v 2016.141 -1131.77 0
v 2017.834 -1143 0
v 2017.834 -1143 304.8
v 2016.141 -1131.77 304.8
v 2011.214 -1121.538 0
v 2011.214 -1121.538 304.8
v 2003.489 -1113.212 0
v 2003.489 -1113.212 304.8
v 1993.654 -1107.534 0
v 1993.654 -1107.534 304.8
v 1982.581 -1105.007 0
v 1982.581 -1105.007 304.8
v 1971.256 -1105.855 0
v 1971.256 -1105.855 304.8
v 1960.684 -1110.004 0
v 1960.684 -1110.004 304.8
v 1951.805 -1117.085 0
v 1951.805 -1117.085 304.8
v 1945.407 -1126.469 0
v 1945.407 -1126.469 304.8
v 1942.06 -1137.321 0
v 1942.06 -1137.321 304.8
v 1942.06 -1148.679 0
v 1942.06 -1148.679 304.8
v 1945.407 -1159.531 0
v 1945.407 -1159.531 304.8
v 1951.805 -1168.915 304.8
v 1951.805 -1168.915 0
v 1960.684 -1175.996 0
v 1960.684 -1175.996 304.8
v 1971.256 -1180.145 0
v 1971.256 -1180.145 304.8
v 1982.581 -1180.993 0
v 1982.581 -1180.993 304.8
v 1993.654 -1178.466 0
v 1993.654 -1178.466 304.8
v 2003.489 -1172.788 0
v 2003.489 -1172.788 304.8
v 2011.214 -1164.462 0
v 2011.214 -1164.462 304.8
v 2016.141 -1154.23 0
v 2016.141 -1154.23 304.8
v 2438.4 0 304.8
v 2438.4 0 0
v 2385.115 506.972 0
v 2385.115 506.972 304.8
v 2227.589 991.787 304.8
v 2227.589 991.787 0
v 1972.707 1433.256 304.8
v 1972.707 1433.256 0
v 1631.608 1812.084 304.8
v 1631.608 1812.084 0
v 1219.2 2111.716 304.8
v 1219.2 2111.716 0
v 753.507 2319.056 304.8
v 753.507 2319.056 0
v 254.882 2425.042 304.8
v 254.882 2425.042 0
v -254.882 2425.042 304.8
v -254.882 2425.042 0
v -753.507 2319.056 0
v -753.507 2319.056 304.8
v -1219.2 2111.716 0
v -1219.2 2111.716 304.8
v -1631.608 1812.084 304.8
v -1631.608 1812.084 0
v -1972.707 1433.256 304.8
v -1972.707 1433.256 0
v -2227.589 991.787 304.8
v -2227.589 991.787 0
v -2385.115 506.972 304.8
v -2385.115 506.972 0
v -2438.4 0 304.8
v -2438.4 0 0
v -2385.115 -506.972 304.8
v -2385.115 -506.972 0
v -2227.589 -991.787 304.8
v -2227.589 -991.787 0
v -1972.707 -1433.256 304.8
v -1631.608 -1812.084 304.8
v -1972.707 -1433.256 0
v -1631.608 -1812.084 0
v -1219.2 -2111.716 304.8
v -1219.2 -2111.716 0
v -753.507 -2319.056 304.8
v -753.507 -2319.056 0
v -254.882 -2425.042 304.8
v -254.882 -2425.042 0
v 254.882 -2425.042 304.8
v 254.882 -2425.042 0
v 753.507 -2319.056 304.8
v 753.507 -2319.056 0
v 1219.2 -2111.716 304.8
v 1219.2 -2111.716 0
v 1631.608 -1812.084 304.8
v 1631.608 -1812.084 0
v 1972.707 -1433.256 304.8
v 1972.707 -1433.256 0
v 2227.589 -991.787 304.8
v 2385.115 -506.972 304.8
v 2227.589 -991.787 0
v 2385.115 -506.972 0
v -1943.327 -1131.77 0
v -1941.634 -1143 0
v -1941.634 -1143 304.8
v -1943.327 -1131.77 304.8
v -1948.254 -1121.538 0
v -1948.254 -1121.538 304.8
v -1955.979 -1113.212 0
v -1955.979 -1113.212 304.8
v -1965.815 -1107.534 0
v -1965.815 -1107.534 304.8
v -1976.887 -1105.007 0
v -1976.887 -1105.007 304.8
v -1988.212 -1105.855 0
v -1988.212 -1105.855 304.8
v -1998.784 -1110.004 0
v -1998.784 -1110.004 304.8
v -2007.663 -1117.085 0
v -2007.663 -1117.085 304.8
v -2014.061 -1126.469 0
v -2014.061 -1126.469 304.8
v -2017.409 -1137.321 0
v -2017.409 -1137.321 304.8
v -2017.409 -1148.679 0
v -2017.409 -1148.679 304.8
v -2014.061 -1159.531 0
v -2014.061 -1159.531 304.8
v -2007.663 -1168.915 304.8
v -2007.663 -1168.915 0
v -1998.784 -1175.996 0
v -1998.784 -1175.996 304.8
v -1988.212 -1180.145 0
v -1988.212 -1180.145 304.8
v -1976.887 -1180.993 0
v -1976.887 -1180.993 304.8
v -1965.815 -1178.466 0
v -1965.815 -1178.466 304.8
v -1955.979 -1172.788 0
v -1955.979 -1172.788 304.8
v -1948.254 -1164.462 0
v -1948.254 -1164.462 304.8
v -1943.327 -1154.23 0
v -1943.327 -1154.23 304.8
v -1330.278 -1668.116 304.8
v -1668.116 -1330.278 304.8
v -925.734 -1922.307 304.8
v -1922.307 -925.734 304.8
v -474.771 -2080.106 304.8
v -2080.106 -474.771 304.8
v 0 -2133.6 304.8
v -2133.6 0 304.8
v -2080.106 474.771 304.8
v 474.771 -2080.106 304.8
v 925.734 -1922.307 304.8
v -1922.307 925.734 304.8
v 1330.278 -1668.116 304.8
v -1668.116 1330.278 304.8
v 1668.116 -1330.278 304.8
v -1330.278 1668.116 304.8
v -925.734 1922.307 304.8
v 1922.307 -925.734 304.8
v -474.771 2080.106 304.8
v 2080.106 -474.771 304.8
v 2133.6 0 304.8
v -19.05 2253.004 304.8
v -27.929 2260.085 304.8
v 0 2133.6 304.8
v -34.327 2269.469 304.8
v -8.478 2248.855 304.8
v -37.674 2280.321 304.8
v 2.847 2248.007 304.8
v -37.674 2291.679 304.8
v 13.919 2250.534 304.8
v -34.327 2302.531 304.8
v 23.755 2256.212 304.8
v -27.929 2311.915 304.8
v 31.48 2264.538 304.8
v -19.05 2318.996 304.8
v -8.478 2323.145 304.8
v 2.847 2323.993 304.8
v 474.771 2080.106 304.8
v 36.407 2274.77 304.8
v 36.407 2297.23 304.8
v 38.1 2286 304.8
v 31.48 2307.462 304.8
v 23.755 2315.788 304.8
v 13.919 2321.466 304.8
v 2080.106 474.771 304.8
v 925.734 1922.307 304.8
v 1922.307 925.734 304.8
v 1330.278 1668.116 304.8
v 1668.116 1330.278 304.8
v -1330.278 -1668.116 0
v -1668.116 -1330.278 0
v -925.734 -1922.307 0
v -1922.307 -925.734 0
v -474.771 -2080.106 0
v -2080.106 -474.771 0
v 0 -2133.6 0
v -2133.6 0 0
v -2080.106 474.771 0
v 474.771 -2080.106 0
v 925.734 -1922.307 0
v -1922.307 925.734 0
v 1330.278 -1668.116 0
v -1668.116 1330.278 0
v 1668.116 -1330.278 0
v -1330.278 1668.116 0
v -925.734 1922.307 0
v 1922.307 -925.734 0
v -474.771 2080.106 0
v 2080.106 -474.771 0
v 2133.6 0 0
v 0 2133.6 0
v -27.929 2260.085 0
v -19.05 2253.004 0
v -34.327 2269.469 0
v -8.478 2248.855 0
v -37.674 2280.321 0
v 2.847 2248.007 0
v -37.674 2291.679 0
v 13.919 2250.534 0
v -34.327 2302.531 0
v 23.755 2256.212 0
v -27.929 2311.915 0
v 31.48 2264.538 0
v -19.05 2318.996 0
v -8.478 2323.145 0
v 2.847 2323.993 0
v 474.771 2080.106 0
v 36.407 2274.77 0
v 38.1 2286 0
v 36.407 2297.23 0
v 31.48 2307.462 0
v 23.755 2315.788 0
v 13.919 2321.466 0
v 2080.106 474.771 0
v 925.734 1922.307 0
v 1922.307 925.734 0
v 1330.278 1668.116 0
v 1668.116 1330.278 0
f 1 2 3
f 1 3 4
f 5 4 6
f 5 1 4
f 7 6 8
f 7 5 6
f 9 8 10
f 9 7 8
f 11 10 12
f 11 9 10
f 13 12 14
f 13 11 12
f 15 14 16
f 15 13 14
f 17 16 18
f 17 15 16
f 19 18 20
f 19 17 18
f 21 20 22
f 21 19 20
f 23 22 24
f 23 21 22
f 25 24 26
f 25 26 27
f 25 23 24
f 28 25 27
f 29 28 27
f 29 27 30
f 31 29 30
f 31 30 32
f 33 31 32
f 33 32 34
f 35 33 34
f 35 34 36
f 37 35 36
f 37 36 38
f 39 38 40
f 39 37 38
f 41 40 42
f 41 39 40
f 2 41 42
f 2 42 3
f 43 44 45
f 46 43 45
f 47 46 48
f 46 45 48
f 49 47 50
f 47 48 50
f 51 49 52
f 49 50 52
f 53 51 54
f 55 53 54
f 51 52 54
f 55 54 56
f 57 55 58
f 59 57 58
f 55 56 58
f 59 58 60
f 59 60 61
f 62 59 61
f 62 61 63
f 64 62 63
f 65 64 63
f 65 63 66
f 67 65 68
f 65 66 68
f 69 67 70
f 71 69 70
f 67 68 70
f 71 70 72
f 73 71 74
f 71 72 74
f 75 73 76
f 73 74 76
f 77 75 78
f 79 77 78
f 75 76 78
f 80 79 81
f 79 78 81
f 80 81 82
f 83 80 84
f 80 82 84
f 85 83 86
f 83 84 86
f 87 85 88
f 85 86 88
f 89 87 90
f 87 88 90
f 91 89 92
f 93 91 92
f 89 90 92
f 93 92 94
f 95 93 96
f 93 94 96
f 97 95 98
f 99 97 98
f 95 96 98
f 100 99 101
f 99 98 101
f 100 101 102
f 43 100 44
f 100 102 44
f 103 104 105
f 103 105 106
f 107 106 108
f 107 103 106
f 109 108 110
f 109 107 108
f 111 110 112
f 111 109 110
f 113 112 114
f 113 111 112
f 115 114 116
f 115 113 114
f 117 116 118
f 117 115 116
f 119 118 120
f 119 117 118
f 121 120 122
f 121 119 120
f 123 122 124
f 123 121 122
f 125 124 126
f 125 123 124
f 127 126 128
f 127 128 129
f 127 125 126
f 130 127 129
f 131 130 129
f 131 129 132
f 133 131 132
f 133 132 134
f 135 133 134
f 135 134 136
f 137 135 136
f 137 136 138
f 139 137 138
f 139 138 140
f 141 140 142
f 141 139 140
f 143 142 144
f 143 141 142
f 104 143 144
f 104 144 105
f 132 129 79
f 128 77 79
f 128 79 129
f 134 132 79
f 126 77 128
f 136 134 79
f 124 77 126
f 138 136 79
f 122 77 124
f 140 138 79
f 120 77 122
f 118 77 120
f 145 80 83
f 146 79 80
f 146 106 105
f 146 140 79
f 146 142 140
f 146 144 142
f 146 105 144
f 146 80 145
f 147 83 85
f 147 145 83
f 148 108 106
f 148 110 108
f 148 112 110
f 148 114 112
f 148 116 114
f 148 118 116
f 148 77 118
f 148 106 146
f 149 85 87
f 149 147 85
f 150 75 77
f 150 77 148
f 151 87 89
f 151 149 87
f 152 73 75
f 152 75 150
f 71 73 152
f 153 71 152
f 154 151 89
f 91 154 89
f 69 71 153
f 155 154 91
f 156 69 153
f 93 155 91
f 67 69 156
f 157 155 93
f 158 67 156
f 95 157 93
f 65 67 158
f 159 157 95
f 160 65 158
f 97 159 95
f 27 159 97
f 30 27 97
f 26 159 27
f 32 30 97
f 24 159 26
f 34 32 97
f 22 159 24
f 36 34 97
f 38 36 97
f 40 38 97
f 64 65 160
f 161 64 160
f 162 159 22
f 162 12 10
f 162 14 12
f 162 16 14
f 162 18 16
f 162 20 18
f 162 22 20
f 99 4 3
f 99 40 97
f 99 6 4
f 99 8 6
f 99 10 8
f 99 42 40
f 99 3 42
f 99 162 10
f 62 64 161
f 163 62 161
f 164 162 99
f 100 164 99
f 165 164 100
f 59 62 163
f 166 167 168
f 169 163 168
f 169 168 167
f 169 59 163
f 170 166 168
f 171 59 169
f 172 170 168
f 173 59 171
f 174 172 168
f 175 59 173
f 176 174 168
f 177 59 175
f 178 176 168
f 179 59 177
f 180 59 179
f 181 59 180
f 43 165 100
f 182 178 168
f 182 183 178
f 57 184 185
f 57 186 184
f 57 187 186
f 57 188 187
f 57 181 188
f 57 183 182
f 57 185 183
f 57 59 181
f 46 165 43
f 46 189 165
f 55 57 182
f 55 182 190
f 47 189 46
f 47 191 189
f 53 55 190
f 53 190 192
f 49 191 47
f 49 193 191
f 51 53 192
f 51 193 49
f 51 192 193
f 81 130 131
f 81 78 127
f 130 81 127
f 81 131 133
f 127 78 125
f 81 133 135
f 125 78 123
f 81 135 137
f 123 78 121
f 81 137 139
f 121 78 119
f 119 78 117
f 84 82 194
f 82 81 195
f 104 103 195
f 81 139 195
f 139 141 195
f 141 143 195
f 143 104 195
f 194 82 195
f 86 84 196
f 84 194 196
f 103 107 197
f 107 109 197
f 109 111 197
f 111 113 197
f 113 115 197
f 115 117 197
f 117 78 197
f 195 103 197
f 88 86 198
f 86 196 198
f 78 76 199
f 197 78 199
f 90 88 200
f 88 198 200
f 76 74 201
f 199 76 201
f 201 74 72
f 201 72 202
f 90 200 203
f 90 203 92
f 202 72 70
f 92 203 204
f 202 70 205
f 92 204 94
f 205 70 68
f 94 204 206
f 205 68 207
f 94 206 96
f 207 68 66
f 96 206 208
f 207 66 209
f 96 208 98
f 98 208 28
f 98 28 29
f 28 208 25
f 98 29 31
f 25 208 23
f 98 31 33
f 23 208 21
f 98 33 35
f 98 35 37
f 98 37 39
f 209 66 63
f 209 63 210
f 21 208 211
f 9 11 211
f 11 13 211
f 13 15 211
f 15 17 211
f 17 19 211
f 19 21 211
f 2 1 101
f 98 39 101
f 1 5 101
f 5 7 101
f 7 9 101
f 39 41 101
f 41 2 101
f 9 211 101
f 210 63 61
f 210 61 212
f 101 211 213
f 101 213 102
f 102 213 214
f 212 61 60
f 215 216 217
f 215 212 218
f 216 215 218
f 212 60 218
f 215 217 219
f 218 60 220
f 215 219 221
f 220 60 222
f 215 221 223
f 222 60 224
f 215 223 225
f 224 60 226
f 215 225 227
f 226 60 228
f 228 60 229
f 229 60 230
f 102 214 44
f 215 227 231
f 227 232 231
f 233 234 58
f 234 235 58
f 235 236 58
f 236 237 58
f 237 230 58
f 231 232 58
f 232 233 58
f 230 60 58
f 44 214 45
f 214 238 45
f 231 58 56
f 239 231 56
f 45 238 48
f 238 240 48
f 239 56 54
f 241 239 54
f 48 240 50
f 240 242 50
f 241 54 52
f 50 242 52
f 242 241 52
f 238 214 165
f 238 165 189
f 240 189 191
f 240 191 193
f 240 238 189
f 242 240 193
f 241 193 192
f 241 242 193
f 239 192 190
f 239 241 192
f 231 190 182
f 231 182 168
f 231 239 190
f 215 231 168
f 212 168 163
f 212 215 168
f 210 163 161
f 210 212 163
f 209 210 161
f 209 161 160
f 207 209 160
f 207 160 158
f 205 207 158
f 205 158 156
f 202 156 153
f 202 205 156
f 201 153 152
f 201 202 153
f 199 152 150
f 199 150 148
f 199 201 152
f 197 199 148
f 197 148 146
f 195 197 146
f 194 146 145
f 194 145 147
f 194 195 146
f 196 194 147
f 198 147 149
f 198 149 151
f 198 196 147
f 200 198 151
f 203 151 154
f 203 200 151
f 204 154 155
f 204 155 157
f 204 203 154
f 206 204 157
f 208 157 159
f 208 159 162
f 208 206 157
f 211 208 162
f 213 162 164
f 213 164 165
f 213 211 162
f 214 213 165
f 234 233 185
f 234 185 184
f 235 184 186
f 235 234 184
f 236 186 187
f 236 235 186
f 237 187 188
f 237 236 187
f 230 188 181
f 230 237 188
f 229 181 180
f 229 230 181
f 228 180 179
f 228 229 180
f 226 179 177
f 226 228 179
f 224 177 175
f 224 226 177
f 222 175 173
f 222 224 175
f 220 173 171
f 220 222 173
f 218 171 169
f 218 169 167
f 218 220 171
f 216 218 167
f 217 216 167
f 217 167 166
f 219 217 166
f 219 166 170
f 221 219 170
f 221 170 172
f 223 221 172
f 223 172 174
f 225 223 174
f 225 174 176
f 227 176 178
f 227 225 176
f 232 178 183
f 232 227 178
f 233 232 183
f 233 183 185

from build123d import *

# Parameters (mm, degrees)
F0_R     = 2438.4
F0_R_2   = 38.1
F0_R_3   = 2133.6
F1_DEPTH = 304.8


# Not quite as in the source:
# - a feature names something its author has since deleted; it is built from what else it names


with BuildPart() as f1:
    # F0 (on Top) → F1 (new body)
    with BuildSketch(Plane.XY):
        Circle(F0_R)
        with Locations((-1979.7340730512, -1143)):
            Circle(F0_R_2, mode=Mode.SUBTRACT)
        with Locations((1979.7340730512, -1143)):
            Circle(F0_R_2, mode=Mode.SUBTRACT)
        Circle(F0_R_3, mode=Mode.SUBTRACT)
        with Locations((0, 2286)):
            Circle(F0_R_2, mode=Mode.SUBTRACT)
    extrude(amount=F1_DEPTH)


solid = f1.part
